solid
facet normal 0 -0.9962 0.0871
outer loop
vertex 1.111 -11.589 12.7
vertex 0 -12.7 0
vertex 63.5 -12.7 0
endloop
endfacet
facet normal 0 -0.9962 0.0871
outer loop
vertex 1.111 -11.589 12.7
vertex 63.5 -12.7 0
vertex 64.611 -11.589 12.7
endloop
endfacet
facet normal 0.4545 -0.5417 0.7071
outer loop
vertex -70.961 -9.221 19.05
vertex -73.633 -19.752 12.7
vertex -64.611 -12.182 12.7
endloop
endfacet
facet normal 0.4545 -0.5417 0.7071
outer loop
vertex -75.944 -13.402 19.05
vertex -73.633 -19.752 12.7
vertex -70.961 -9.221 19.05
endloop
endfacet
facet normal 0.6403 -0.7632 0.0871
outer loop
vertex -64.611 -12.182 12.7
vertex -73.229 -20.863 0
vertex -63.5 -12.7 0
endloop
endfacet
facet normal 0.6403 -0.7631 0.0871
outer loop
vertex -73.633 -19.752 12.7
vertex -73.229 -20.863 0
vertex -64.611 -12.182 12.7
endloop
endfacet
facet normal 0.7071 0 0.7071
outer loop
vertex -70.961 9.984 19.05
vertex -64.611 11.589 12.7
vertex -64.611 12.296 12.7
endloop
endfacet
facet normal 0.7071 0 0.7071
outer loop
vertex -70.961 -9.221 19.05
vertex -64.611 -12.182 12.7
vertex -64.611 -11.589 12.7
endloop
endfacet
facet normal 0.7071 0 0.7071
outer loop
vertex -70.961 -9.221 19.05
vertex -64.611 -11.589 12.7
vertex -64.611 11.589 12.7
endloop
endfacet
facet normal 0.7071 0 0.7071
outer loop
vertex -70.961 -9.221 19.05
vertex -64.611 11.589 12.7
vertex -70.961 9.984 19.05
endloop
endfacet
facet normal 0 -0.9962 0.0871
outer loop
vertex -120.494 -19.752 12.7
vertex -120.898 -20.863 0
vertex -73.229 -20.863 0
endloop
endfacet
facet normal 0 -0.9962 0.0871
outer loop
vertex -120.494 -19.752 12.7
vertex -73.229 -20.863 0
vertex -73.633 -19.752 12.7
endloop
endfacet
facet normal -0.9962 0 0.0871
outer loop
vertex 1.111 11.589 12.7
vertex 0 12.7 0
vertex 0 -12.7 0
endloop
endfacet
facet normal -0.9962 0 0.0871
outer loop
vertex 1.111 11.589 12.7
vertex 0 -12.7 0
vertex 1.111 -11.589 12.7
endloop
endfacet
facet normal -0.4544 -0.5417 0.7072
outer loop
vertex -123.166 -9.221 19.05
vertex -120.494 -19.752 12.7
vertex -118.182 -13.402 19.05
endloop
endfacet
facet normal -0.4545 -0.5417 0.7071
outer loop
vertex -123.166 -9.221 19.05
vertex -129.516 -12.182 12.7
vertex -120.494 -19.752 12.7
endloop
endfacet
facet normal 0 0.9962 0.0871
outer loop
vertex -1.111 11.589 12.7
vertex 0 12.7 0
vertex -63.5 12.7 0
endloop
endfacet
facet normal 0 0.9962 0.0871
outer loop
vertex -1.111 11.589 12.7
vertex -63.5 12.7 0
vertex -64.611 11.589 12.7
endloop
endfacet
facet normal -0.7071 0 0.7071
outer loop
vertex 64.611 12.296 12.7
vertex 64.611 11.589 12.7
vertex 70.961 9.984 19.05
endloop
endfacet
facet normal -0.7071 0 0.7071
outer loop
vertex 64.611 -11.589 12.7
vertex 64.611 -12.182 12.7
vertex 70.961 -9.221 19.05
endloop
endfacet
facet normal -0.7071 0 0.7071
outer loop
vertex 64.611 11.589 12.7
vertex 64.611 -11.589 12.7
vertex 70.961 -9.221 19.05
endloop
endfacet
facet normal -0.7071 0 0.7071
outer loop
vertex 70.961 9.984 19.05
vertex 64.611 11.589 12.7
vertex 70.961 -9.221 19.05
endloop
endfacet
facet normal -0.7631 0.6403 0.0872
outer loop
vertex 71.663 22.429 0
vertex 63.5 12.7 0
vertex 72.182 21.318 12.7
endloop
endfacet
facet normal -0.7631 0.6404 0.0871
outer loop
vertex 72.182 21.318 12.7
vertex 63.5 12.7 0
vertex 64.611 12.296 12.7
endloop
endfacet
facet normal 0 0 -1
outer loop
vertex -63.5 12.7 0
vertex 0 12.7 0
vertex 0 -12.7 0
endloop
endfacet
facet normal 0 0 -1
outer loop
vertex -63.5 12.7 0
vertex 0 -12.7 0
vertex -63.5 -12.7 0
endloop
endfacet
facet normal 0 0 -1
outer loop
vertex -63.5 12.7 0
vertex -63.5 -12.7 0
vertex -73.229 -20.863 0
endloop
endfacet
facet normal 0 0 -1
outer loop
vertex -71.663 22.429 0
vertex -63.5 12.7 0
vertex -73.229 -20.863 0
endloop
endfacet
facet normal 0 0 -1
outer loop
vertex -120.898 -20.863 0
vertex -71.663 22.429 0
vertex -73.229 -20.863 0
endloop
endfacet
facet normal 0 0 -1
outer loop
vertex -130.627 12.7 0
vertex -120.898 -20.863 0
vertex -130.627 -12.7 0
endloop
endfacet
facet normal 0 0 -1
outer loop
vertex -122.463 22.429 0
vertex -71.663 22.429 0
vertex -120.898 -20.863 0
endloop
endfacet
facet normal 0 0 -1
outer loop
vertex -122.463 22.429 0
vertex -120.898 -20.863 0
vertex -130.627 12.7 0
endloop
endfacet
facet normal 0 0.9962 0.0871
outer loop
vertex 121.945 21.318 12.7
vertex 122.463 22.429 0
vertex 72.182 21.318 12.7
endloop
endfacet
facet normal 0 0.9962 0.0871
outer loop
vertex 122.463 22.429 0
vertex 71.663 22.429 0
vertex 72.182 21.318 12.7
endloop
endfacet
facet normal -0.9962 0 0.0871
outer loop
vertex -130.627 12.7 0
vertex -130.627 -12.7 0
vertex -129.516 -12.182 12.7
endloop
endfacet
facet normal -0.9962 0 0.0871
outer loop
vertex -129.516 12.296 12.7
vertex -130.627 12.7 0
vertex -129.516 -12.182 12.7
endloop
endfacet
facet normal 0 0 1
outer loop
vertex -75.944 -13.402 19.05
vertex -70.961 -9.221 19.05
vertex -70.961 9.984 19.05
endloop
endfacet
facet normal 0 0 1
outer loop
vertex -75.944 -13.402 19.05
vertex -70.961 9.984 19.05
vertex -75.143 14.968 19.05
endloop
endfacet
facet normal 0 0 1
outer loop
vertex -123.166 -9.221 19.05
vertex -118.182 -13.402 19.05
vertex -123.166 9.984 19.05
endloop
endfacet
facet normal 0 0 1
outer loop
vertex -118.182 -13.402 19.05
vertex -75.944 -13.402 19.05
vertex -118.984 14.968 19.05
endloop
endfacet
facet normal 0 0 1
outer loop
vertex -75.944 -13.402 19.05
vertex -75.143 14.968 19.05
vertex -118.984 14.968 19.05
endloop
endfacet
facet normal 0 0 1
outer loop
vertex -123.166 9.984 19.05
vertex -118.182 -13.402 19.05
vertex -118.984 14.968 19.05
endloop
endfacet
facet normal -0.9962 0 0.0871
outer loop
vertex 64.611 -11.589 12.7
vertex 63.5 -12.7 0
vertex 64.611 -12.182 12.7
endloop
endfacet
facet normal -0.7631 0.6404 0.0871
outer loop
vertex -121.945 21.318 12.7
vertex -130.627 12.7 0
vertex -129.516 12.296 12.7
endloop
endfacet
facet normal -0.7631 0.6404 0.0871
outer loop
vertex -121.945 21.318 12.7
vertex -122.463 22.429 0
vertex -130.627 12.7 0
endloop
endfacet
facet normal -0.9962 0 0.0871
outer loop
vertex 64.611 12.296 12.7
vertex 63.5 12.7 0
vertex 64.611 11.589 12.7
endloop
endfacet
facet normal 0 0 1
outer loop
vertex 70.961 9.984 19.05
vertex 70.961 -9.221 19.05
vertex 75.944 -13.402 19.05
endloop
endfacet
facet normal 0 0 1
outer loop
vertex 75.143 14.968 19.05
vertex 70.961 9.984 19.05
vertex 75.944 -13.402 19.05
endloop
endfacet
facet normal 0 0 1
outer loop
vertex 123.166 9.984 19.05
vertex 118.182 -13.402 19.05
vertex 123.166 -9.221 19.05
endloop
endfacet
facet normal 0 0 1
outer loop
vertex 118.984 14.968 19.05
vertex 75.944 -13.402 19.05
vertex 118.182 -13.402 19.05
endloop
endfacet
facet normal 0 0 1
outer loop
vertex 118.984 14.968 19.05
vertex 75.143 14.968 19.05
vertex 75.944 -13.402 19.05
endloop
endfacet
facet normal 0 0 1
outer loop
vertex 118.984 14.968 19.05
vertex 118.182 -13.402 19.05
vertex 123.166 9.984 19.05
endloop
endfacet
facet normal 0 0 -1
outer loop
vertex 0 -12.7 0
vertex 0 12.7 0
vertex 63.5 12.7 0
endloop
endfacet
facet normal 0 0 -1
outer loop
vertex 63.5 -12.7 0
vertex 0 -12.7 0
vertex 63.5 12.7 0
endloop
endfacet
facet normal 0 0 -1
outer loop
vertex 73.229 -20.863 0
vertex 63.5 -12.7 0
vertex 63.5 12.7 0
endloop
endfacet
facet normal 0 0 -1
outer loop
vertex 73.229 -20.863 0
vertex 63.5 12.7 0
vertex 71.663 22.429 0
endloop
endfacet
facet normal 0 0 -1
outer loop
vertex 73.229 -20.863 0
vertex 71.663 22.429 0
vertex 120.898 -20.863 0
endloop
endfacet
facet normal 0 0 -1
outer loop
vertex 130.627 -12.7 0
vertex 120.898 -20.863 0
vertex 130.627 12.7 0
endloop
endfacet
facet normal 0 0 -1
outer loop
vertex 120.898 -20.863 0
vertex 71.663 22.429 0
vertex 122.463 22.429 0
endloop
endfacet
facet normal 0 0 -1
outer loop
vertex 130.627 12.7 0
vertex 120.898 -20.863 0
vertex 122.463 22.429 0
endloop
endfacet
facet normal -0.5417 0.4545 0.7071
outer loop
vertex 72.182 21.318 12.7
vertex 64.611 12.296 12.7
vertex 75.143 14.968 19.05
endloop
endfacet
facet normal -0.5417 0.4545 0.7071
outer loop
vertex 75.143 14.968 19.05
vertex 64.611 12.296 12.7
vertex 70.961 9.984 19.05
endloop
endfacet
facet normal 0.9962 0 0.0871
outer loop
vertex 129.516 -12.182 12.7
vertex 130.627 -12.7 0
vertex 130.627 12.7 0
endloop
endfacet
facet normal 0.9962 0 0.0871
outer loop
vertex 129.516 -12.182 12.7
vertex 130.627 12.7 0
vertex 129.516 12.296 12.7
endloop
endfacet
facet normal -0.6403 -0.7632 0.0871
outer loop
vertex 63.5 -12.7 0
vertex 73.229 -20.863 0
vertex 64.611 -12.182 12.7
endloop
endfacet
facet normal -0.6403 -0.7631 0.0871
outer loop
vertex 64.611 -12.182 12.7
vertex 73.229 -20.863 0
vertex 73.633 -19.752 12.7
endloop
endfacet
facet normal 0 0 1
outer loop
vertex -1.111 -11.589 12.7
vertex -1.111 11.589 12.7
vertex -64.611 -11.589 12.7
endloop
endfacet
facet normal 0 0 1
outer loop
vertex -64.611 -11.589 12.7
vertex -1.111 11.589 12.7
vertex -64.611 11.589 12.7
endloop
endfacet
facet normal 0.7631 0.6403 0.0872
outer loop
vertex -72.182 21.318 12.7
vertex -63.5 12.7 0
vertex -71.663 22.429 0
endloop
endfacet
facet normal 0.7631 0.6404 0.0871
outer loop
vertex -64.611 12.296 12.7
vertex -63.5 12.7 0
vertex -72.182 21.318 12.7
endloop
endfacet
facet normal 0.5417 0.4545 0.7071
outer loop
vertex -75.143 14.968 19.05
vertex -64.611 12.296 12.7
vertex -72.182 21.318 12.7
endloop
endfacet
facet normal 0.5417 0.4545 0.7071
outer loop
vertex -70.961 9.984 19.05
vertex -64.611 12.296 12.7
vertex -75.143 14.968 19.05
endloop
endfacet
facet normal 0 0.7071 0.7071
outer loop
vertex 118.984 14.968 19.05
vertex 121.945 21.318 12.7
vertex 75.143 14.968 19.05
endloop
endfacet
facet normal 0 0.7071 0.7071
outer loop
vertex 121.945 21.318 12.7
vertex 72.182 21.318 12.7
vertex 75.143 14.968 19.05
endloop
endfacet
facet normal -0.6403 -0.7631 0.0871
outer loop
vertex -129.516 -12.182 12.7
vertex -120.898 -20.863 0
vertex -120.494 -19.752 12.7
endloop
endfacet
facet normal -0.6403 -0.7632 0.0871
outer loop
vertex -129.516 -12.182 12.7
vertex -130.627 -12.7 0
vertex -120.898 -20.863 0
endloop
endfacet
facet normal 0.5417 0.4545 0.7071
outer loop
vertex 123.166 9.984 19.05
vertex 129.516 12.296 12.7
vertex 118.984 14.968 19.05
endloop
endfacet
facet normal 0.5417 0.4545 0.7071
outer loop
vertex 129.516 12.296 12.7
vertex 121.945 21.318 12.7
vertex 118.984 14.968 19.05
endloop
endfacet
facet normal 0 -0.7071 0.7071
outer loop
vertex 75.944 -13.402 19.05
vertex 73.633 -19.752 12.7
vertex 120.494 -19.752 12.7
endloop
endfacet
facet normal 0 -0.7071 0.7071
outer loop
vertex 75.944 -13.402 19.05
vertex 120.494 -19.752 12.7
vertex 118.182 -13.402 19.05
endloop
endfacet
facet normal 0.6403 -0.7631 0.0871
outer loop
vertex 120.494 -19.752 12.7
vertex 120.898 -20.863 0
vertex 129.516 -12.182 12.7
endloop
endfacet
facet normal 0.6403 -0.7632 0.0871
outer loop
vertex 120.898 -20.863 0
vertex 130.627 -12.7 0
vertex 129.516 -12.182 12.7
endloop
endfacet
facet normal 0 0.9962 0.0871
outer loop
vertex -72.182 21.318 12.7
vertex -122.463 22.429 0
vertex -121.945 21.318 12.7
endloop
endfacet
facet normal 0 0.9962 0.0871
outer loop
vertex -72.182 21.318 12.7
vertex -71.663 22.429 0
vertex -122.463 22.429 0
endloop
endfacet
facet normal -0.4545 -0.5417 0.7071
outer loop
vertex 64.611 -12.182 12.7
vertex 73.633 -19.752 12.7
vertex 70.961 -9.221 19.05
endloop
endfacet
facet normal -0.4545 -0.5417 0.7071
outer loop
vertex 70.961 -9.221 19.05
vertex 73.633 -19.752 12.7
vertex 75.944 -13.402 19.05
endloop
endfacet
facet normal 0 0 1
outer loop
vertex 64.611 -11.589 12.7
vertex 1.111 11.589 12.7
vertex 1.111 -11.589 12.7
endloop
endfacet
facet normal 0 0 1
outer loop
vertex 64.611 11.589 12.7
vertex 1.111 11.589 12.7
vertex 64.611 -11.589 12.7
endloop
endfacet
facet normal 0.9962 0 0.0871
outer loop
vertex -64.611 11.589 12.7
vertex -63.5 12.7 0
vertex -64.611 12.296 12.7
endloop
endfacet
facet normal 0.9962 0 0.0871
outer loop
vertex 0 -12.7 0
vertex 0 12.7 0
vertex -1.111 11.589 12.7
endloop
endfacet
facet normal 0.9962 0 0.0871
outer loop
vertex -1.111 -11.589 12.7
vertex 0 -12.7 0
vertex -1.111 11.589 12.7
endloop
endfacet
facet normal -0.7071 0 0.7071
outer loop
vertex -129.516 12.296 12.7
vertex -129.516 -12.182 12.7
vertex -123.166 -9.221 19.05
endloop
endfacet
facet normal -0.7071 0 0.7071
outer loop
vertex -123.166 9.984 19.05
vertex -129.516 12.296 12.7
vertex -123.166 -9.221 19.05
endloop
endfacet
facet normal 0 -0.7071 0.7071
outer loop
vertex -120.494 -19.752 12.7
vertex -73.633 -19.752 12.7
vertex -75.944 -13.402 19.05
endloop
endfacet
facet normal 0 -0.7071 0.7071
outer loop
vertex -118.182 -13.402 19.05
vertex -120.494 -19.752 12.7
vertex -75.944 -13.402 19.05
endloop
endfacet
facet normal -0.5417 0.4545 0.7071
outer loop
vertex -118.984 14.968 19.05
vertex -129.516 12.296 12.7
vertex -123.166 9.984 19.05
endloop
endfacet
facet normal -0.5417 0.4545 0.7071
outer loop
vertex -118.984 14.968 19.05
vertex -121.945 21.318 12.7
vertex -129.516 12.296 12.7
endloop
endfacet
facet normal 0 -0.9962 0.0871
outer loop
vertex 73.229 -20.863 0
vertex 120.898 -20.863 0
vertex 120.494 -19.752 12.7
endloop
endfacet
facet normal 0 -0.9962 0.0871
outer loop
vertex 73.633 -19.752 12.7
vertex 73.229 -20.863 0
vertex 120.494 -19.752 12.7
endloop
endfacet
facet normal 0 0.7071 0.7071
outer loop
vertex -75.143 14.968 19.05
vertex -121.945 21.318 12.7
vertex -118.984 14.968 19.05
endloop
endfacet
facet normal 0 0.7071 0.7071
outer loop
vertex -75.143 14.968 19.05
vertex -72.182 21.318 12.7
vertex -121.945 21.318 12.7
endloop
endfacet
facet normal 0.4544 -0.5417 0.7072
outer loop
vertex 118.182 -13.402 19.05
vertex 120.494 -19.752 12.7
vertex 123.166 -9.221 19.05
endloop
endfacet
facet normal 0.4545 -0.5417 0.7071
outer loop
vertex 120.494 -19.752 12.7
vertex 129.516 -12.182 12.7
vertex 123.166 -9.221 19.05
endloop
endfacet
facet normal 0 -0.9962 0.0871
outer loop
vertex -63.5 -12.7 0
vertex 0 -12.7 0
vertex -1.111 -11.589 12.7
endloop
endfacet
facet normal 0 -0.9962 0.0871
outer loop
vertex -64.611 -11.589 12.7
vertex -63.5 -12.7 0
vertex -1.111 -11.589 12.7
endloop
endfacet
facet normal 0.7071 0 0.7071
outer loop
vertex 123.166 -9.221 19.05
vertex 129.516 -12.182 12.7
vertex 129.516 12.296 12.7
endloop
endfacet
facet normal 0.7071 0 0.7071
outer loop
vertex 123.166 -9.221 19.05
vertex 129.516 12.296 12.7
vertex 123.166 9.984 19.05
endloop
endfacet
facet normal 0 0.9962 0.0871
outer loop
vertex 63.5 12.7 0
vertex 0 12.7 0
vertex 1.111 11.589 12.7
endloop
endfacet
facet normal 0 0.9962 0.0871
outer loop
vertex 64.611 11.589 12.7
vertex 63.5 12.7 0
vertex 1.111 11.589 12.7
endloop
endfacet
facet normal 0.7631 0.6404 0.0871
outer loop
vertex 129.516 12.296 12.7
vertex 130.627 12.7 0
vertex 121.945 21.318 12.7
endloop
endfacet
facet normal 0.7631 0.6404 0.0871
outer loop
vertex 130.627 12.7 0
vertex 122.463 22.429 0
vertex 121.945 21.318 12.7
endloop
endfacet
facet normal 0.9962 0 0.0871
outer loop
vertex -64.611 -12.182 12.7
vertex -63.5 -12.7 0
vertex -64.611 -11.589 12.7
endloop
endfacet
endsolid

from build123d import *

# Parameters (mm, degrees)
F0_W     = 63.5
F0_H     = 25.4
F0_W_2   = 7.7363570929
F1_DEPTH = 12.7
F1_TAPER = 5
F2_DEPTH = 12.7
F2_TAPER = 5
F4_DEPTH = 6.35
F4_TAPER = 45


with BuildPart() as f1:
    # F0 (on Top) → F1 (new body)
    with BuildSketch(Plane.XY):
        with Locations((31.75, 0)):
            Rectangle(F0_W, F0_H)
        with Locations((67.3681785464, 0)):
            Rectangle(F0_W_2, F0_H)
    extrude(amount=F1_DEPTH, taper=F1_TAPER)

    # F0 (on Top) → F2 (join)
    with BuildSketch(Plane.XY):
        Polygon((71.663402643, 22.4287644276), (63.5, 12.7), (71.2363570929, 12.7), (71.2363570929, -12.7), (63.5, -12.7), (73.2287644276, -20.863402643), (120.8980408584, -20.863402643), (130.626805286, -12.7), (130.626805286, 12.7), (122.463402643, 22.4287644276), align=None)
        with Locations((67.3681785464, 0)):
            Rectangle(F0_W_2, F0_H)
    extrude(amount=F2_DEPTH, taper=F2_TAPER)

    # F3 (on face) → F4 (join)
    with BuildSketch(Plane.XY.offset(12.7)):
        Polygon((64.6111060268, 12.2955904791), (64.6111060268, 11.5888939732), (64.6111060268, -11.5888939732), (64.6111060268, -12.1818827507), (73.6331739485, -19.7522966162), (120.4936313376, -19.7522966162), (129.5156992593, -12.1818827507), (129.5156992593, 12.2955904791), (121.9452853937, 21.3176584008), (72.1815198923, 21.3176584008), align=None)
    extrude(amount=F4_DEPTH, taper=F4_TAPER)


with BuildPart() as f5_1:
    # F5: instance of F1
    add(f1.part.mirror(Plane.YZ))


solid = Compound([f1.part, f5_1.part])
